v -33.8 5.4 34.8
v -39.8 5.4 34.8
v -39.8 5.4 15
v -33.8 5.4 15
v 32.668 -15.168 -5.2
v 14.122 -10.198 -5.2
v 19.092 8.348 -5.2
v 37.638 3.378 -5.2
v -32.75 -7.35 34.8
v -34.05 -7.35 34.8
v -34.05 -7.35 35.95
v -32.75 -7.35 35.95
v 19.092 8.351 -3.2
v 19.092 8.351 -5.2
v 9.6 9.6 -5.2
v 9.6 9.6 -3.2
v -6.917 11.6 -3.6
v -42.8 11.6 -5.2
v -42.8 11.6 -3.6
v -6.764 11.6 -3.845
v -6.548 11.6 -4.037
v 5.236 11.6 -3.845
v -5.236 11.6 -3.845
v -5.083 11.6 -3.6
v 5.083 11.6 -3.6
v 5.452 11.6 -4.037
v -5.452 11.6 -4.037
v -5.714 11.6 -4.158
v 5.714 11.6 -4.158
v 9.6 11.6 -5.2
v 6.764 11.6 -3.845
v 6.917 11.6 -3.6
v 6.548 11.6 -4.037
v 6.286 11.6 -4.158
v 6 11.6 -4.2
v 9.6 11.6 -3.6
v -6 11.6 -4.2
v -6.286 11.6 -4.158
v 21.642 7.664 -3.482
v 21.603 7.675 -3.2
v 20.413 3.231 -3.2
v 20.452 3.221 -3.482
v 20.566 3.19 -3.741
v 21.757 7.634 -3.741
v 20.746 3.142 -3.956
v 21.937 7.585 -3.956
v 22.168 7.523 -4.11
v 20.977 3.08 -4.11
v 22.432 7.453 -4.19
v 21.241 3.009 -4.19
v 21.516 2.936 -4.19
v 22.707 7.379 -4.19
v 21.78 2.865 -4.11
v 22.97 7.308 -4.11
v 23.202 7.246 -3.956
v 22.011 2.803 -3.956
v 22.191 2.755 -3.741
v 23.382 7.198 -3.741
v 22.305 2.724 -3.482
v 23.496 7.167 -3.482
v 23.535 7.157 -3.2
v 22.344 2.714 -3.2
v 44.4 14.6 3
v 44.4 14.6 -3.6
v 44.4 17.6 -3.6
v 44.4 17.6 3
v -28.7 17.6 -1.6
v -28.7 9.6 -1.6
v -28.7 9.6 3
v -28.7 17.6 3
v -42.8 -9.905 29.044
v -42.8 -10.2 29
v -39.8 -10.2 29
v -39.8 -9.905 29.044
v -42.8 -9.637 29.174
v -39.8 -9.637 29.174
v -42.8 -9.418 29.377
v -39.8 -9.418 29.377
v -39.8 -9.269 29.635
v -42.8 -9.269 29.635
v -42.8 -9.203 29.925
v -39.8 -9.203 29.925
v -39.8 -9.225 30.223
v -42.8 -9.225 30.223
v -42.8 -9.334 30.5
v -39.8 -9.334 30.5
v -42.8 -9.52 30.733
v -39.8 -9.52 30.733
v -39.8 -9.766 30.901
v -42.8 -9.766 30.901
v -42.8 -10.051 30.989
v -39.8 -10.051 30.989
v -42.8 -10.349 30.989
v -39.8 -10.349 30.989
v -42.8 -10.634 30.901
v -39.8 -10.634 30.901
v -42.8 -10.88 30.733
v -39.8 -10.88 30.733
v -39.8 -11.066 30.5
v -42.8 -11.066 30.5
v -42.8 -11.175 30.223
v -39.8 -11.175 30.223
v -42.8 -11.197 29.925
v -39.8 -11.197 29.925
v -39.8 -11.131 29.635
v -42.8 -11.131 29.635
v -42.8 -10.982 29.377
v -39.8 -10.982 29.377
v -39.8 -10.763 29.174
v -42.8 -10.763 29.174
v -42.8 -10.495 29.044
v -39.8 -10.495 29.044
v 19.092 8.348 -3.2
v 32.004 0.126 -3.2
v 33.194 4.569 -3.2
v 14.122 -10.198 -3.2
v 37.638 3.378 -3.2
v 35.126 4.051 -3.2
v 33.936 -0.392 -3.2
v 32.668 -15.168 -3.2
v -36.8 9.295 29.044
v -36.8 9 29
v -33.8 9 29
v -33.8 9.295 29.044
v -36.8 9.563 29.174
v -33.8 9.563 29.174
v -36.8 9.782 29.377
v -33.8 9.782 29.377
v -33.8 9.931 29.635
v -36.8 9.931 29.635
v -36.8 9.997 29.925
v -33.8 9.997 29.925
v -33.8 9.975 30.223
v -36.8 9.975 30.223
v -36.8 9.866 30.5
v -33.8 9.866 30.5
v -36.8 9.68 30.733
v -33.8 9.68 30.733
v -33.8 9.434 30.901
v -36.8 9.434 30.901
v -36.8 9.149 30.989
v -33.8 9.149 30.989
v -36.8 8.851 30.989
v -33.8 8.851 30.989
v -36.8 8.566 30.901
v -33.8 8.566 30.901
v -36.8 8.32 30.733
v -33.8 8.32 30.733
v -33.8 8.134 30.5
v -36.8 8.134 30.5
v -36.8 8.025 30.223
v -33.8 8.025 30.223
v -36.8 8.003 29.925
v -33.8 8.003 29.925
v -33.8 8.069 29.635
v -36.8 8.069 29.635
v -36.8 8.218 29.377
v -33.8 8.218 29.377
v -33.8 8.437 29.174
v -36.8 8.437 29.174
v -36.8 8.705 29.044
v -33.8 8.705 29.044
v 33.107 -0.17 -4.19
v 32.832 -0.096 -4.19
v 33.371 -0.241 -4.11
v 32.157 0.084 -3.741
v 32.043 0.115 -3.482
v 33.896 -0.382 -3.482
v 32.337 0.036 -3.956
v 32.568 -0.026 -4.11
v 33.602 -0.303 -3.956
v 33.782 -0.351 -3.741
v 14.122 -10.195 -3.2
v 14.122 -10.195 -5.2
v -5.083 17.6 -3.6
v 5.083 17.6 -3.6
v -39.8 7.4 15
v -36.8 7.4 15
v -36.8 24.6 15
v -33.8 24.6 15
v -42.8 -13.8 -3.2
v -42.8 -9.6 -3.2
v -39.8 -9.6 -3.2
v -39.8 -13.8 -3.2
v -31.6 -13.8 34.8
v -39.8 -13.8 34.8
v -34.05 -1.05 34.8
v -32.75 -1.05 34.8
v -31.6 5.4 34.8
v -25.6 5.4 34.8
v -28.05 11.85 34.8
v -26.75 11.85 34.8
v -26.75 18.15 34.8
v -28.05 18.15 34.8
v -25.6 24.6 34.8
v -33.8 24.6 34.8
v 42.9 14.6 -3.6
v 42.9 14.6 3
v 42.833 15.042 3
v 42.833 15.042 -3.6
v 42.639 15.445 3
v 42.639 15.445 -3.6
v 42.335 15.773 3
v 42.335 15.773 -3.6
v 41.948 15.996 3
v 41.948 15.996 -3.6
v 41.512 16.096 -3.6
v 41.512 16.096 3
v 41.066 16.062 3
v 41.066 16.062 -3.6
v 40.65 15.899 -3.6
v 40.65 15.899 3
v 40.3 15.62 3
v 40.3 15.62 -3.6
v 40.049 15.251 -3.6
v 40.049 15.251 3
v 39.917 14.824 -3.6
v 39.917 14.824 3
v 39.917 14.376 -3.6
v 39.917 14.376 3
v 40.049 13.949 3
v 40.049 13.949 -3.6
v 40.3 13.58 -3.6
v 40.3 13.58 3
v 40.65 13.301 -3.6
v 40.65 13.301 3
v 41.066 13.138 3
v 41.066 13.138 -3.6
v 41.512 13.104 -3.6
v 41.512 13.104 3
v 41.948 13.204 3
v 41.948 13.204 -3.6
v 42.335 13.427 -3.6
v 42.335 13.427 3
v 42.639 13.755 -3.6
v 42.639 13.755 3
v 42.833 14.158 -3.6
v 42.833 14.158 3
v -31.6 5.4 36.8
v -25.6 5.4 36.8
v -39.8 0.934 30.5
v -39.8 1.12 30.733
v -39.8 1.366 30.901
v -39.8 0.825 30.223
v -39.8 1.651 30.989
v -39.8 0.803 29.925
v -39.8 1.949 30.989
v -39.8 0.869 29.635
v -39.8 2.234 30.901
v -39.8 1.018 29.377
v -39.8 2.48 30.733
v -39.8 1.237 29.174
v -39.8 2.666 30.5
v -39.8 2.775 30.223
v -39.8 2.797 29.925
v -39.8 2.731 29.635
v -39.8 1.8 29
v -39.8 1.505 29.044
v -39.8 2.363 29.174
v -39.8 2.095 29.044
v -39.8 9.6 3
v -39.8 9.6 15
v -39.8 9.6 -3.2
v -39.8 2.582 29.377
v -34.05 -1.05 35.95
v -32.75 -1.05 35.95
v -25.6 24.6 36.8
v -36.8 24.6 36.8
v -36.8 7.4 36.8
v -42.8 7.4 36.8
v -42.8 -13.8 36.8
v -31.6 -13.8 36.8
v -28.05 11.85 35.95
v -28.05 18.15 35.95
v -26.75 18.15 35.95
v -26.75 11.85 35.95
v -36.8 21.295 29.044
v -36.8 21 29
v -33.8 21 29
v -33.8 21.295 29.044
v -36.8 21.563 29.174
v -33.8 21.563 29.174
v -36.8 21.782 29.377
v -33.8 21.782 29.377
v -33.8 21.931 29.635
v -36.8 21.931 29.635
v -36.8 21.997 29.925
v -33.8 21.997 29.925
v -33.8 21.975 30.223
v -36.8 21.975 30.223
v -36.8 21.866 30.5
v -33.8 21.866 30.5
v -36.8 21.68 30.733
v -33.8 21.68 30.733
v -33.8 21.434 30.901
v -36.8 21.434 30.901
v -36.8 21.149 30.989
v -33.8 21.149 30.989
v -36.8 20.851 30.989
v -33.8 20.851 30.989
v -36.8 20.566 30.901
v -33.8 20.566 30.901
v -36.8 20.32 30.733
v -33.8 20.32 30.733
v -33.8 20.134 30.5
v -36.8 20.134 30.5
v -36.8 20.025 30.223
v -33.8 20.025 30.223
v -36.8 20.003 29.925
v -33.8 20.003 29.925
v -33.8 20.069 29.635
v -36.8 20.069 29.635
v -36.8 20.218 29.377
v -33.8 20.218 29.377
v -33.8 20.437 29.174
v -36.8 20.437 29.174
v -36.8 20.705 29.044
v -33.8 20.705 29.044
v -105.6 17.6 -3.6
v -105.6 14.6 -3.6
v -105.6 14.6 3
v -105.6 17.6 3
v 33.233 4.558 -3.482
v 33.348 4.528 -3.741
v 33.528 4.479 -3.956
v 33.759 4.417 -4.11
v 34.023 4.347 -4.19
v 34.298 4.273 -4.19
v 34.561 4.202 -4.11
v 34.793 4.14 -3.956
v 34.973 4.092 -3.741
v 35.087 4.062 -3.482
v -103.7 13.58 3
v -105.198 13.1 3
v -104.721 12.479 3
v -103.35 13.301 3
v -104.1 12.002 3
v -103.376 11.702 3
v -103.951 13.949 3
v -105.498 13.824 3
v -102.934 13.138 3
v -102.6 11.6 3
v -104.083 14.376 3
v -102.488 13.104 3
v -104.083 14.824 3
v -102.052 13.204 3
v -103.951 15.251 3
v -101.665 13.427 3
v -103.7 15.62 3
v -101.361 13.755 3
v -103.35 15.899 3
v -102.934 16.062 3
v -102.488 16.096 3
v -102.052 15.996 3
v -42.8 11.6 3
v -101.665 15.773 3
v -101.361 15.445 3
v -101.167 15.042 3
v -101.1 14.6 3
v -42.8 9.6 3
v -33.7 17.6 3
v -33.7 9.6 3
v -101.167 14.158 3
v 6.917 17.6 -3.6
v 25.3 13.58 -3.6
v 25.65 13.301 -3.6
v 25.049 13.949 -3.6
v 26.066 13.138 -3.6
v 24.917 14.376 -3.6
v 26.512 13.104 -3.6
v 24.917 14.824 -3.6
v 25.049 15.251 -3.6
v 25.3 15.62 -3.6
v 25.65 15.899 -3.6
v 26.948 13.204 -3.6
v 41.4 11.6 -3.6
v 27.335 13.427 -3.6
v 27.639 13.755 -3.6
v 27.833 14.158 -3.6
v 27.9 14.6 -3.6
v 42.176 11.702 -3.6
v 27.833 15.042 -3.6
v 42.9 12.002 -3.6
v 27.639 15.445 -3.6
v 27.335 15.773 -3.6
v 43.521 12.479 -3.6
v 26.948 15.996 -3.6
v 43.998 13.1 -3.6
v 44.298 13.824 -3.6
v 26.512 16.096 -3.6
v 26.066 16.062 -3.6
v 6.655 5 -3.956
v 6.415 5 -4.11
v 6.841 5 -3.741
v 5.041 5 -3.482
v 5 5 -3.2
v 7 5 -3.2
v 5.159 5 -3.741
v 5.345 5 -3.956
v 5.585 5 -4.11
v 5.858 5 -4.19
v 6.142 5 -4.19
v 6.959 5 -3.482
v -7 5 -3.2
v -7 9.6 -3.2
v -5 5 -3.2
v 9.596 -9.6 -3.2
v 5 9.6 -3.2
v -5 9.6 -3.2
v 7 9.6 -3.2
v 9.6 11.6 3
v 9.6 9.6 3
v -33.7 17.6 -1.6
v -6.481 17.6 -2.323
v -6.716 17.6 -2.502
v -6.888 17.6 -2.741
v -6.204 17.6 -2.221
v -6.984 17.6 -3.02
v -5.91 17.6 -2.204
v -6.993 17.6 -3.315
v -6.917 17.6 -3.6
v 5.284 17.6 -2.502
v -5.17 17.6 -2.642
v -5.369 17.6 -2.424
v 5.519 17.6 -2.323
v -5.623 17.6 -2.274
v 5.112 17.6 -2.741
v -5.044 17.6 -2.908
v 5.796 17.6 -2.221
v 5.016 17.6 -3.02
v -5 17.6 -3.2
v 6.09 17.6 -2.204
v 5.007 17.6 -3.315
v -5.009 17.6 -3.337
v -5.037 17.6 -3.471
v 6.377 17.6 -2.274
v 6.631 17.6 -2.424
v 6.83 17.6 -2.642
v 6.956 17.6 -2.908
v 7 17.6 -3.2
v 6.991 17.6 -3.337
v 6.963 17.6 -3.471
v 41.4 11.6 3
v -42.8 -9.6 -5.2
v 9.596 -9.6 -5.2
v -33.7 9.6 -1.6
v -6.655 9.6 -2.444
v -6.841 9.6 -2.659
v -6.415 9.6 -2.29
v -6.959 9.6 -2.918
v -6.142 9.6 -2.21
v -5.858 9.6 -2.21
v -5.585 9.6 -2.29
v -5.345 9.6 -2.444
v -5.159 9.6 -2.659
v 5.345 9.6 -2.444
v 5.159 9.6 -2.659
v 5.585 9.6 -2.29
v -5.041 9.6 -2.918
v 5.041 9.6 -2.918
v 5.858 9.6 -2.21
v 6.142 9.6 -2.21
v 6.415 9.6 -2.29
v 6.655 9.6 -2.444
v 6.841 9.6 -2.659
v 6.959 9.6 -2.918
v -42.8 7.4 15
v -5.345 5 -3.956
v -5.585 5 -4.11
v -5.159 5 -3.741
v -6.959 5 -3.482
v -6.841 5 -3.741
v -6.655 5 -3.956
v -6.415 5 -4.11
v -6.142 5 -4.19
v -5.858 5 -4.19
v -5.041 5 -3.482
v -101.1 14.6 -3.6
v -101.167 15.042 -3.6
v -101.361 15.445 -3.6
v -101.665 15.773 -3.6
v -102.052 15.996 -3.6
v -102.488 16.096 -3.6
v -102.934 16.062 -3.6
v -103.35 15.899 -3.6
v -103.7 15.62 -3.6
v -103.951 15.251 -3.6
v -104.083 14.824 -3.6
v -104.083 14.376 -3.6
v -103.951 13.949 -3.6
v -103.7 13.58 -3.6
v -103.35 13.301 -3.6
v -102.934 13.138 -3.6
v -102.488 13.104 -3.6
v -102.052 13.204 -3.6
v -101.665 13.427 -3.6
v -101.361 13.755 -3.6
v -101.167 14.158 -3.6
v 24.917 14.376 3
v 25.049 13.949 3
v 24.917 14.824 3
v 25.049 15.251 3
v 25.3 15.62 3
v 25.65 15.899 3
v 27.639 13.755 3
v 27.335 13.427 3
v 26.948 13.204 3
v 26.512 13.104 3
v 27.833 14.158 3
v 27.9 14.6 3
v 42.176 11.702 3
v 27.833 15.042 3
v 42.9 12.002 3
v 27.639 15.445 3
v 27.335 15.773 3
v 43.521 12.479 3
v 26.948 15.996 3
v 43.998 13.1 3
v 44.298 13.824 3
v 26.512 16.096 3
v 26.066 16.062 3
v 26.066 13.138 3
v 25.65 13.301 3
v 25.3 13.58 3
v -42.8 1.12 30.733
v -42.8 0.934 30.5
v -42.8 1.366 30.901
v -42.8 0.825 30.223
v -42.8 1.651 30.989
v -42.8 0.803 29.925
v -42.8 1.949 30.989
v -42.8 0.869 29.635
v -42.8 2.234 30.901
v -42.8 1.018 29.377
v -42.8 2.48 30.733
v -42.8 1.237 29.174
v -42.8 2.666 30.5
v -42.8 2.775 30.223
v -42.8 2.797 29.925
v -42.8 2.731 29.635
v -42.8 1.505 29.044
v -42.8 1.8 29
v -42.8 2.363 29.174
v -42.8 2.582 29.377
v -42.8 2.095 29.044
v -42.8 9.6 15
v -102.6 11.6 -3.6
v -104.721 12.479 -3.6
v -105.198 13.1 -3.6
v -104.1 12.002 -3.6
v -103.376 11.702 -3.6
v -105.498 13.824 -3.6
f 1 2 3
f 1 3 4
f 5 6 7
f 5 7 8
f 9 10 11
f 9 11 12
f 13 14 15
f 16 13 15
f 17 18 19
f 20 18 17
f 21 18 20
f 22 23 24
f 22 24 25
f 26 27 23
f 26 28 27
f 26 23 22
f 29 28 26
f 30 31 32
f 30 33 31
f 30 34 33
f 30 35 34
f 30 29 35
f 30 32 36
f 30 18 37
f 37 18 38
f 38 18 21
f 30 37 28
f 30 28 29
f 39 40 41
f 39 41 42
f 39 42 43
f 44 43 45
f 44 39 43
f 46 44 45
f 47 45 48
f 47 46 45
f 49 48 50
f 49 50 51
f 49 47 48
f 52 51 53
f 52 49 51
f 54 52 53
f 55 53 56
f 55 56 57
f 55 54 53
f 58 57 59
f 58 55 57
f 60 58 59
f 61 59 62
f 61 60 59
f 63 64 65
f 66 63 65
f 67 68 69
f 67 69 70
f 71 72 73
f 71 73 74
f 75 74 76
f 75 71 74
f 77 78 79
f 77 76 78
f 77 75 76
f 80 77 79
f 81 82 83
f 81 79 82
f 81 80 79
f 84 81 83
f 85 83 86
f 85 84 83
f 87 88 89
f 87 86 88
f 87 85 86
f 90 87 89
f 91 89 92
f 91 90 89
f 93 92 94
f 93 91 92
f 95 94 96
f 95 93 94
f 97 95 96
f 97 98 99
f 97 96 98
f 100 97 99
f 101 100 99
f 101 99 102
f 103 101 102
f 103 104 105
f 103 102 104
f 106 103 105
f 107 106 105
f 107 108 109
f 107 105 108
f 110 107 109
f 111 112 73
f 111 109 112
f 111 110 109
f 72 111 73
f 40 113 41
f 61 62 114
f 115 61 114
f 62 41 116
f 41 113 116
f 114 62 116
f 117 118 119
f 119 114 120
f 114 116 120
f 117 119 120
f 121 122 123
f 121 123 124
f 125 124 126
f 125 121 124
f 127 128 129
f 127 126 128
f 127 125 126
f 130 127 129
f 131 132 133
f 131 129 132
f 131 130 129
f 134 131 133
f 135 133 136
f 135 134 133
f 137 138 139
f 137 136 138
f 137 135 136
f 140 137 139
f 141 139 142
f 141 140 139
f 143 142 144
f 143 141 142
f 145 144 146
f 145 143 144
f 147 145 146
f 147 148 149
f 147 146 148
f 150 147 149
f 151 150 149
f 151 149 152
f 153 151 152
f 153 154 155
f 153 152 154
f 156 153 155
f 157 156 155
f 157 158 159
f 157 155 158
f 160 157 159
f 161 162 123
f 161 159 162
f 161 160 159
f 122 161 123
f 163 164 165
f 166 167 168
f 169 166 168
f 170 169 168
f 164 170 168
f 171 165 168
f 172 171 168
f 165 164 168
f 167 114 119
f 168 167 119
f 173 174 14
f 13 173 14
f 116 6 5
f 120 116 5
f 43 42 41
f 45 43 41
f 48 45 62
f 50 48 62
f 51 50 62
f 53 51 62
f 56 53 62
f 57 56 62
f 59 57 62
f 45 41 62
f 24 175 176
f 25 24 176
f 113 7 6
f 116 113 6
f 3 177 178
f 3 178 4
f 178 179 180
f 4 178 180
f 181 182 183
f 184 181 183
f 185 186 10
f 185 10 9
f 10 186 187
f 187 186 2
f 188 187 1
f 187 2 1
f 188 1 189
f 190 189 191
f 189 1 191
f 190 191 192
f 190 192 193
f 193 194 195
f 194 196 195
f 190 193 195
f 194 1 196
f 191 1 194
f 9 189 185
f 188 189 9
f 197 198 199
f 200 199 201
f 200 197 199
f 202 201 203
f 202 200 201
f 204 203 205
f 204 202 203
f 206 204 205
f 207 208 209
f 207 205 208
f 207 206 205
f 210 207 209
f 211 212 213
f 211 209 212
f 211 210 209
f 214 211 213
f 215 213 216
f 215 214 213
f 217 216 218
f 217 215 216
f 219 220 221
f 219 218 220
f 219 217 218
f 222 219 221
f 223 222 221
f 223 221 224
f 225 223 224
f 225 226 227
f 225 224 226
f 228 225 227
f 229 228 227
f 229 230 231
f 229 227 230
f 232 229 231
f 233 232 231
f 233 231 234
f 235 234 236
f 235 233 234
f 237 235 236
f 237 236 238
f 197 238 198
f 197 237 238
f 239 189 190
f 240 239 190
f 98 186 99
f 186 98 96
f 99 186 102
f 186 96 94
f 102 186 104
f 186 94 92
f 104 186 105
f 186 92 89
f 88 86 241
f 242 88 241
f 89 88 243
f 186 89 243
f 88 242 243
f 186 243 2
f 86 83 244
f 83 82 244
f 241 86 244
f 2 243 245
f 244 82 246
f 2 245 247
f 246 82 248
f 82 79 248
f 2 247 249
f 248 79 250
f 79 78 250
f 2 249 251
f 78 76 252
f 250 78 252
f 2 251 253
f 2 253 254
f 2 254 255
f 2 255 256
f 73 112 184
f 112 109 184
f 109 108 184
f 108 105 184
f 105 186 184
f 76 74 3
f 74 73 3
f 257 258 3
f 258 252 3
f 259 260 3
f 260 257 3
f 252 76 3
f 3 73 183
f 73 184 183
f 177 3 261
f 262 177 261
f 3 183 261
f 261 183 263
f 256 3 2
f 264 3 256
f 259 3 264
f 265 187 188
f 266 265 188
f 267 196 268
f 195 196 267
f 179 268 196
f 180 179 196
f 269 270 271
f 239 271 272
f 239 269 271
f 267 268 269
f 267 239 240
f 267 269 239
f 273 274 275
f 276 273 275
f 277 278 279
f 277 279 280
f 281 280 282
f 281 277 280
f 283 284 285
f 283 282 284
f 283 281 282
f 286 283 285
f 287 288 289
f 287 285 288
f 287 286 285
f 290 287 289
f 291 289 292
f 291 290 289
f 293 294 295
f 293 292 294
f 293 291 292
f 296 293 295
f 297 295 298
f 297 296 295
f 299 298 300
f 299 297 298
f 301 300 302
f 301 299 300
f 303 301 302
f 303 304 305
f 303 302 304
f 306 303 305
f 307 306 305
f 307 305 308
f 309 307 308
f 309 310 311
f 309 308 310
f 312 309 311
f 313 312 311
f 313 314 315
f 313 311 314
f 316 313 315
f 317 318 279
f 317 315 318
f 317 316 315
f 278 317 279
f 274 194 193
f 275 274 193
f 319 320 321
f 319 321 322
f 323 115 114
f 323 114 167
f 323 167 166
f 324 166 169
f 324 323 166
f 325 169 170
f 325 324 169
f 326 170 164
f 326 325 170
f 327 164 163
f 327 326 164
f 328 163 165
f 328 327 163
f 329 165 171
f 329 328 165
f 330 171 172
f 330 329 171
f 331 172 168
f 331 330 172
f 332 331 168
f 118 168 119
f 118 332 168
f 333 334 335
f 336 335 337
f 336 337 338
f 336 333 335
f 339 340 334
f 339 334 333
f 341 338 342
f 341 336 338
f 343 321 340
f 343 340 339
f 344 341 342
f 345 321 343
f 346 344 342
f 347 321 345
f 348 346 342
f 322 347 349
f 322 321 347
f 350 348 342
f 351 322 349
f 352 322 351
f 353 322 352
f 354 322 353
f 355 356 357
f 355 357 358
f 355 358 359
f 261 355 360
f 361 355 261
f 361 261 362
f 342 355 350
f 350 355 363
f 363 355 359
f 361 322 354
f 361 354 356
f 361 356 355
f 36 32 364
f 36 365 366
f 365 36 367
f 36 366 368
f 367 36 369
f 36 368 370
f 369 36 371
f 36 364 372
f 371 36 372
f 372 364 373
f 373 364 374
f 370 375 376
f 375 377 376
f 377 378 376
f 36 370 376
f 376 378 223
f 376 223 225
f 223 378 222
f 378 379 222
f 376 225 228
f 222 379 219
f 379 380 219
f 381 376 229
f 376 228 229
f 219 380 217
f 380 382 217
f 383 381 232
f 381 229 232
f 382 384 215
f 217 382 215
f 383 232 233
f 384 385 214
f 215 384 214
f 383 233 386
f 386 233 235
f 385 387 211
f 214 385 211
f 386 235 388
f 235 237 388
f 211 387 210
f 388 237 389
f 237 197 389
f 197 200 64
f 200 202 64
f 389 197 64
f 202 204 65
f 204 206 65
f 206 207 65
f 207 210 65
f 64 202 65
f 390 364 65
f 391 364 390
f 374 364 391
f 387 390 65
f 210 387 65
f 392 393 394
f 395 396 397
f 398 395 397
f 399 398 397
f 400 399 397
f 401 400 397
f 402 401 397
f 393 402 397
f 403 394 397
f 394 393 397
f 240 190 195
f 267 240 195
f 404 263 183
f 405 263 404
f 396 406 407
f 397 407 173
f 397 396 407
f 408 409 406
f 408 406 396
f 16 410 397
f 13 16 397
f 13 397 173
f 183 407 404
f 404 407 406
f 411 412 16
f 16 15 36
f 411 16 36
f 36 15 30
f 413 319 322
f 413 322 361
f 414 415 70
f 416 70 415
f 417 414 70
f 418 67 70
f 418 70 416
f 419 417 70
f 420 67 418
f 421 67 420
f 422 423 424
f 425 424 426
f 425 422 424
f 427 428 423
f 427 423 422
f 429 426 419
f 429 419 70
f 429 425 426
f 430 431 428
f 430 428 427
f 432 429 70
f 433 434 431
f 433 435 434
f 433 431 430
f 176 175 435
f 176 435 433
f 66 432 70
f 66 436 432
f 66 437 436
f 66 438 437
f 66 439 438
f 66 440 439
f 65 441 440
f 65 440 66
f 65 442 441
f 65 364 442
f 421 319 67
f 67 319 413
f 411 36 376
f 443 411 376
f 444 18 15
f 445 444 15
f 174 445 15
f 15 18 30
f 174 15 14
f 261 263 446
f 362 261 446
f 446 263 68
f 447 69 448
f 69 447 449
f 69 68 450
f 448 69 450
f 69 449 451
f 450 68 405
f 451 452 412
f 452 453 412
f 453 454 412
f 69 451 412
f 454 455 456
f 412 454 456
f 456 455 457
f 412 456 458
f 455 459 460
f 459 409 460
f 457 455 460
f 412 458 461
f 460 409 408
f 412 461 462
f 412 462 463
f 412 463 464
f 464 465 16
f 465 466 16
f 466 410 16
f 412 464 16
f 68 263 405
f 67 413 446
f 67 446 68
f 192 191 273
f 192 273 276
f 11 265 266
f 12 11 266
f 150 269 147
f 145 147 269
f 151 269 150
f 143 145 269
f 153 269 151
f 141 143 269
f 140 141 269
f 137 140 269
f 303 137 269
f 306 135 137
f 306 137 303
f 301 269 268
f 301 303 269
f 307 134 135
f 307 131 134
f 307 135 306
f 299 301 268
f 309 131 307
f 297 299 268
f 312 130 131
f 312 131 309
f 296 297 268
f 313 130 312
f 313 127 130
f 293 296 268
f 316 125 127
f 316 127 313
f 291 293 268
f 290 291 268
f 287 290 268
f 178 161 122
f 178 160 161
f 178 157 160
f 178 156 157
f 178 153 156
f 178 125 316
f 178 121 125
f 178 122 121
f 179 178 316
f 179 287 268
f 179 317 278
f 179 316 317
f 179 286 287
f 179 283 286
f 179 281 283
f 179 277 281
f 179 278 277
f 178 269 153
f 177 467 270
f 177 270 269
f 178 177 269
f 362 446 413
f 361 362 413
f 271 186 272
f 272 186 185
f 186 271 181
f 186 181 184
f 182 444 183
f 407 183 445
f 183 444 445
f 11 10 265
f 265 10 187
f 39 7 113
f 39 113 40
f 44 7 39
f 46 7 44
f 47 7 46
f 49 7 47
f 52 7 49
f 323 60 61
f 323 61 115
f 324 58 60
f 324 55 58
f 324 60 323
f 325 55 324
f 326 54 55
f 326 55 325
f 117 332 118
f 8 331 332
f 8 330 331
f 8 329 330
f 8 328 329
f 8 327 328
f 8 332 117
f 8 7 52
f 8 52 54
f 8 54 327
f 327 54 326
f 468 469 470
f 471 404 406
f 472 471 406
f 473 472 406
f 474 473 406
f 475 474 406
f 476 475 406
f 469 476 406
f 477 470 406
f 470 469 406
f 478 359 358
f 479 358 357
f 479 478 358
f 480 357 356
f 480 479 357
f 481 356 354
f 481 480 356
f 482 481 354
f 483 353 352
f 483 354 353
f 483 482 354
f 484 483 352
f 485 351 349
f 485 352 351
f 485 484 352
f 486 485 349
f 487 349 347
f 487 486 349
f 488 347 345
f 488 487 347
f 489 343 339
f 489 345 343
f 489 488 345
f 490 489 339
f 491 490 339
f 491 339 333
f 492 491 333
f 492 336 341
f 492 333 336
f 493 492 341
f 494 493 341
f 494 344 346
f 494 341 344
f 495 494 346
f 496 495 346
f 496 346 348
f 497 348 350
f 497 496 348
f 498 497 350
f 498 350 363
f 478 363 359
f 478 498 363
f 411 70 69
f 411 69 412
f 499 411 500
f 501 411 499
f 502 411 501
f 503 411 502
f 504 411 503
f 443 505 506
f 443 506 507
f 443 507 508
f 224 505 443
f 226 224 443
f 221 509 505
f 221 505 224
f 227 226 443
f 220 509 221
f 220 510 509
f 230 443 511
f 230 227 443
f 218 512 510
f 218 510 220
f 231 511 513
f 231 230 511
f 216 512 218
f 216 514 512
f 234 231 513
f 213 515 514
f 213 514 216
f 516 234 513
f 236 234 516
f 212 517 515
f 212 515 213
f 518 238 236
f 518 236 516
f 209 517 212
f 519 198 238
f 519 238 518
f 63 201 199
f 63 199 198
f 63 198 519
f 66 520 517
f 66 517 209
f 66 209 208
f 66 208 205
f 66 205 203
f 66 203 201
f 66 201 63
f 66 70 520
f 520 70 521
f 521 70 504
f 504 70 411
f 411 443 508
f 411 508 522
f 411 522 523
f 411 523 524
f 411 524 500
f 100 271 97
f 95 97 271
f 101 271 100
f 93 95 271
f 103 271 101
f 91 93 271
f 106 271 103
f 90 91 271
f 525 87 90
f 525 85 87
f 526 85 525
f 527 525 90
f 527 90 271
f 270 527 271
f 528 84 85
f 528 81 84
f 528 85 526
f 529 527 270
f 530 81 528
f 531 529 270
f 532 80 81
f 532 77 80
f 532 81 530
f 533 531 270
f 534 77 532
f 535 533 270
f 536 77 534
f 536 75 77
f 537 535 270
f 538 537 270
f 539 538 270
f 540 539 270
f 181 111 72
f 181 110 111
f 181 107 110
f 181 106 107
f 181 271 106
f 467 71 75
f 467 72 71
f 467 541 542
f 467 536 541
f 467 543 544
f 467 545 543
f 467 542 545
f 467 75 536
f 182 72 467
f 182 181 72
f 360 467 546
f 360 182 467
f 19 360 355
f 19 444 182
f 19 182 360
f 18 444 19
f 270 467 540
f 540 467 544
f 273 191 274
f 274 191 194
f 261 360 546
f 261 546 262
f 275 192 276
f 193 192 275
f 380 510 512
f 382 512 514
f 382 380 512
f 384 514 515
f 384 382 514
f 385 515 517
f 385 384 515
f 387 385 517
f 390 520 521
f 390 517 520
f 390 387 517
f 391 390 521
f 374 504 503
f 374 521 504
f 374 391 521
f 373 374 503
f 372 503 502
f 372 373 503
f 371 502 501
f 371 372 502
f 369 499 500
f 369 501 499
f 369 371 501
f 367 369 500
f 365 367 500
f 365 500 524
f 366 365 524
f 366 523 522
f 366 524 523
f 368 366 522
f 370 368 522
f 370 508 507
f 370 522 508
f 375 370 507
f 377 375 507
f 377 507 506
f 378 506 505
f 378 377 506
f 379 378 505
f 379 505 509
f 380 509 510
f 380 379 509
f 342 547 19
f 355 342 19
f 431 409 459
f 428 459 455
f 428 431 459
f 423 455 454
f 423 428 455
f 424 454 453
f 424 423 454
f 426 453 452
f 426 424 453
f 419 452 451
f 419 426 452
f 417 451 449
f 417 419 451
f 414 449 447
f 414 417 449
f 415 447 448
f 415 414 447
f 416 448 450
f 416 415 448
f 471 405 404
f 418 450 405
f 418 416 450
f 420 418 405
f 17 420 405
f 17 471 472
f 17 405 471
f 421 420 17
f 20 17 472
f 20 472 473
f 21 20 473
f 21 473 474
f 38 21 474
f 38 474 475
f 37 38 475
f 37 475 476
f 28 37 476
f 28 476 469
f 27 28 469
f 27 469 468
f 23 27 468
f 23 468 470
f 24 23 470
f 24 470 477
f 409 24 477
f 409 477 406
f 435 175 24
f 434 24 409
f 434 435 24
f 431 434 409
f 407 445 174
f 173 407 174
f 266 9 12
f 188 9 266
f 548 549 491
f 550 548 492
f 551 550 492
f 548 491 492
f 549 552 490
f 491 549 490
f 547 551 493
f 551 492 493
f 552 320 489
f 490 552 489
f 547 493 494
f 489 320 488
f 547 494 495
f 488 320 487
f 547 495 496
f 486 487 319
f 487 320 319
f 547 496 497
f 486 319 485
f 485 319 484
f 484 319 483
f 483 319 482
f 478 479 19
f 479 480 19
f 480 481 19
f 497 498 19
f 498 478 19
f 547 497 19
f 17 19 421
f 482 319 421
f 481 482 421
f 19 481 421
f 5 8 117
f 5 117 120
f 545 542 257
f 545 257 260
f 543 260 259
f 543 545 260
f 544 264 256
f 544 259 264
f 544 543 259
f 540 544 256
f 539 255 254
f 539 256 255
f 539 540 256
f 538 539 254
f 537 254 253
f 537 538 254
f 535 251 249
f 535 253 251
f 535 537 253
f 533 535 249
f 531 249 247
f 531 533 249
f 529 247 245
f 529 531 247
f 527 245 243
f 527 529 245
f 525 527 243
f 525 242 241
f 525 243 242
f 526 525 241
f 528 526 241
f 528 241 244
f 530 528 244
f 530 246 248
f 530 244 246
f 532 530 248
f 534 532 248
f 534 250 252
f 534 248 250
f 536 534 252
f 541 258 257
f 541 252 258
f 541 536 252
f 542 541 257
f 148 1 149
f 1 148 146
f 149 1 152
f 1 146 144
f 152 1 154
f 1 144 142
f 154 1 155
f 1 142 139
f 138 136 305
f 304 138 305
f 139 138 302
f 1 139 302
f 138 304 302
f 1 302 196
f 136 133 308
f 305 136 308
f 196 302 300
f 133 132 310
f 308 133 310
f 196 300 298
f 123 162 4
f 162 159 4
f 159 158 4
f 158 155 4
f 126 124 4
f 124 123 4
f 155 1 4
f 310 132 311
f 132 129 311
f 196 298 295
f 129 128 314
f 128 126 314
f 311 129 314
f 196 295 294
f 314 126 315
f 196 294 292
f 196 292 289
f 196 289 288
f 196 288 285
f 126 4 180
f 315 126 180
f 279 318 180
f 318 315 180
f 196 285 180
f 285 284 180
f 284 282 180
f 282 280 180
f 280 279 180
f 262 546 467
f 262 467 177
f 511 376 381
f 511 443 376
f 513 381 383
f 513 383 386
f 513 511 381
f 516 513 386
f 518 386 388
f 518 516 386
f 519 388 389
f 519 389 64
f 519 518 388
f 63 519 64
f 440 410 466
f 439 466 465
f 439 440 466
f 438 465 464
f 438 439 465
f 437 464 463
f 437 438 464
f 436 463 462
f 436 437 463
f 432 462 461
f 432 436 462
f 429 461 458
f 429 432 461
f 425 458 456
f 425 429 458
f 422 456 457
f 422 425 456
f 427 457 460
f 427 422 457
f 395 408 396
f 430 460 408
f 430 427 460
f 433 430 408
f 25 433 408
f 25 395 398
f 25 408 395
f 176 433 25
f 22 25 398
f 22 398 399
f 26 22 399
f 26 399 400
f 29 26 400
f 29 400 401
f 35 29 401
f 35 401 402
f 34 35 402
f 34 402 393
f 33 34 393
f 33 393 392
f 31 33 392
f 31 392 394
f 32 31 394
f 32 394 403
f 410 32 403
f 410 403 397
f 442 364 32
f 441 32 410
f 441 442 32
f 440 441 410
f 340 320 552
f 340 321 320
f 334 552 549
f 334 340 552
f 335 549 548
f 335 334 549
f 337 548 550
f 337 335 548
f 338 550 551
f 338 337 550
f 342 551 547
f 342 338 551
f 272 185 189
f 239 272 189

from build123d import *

# Parameters (mm, degrees)
RECTANGLE008_W             = 5
RECTANGLE008_H             = 10
EXTRUDE015_DEPTH           = 5.4
CYLINDER009_R              = 1
CYLINDER009_DEPTH          = 7
CYLINDER008_R              = 1
CYLINDER008_DEPTH          = 7
FUSION019_PLACEMENT_ANGLE  = 15
CYLINDER011_R              = 1
CYLINDER011_DEPTH          = 10
CYLINDER010_R              = 1
CYLINDER010_DEPTH          = 10
CYLINDER013_R              = 1
CYLINDER013_DEPTH          = 10
CYLINDER012_R              = 1
CYLINDER012_DEPTH          = 10
CYLINDER007_R              = 1
CYLINDER007_DEPTH          = 20
CYLINDER006_R              = 1
CYLINDER006_DEPTH          = 20
BOX011_W                   = 52.4
BOX011_H                   = 2
BOX011_DEPTH               = 8.2
EXTRUDE012_DEPTH           = 2
RECTANGLE006_W             = 19.2
RECTANGLE006_H             = 19.2
EXTRUDE013_DEPTH           = 2
EXTRUDE013_PLACEMENT_ANGLE = 15
BOX010_W                   = 52.4
BOX010_H                   = 19.2
BOX010_DEPTH               = 2
CYLINDER004_R              = 1.5
CYLINDER004_DEPTH          = 10
CYLINDER005_R              = 1.5
CYLINDER005_DEPTH          = 10
CYLINDER003_R              = 1.5
CYLINDER003_DEPTH          = 10
RECTANGLE007_W             = 150
RECTANGLE007_H             = 6
EXTRUDE014_DEPTH           = 6.6
FILLET001_R                = 3
BOX009_W                   = 6
BOX009_H                   = 2
BOX009_DEPTH               = 21.8
BOX008_W                   = 1.3
BOX008_H                   = 6.3
BOX008_DEPTH               = 1.15
BOX007_W                   = 11.2
BOX007_H                   = 19.2
BOX007_DEPTH               = 2
BOX006_W                   = 3
BOX006_H                   = 19.2
BOX006_DEPTH               = 38
BOX004_W                   = 1.3
BOX004_H                   = 6.3
BOX004_DEPTH               = 1.15
BOX003_W                   = 11.2
BOX003_H                   = 19.2
BOX003_DEPTH               = 2
BOX001_W                   = 3
BOX001_H                   = 19.2
BOX001_DEPTH               = 19.8
BOX014_W                   = 3
BOX014_H                   = 4.2
BOX014_DEPTH               = 18.2


with BuildPart() as extrude016:
    # Rectangle008 → Extrude015 (new body)
    with BuildSketch(Plane(origin=(-33.7, 9.6, 8.4), x_dir=(1, 0, 0), z_dir=(0, 0, 1))):
        with Locations((2.5, 5)):
            Rectangle(RECTANGLE008_W, RECTANGLE008_H)
    extrude(amount=EXTRUDE015_DEPTH)


with BuildPart() as extrude016_1:
    # Extrude015 placement: moved
    add(extrude016.part.moved(Location((0, 0, -10))))


with BuildPart() as cylinder009:
    # Cylinder009 → Cylinder009 (new body)
    with BuildSketch(Plane(origin=(-6, 12, -3.2), x_dir=(1, 0, 0), z_dir=(0, -1, 0))):
        Circle(CYLINDER009_R)
    extrude(amount=CYLINDER009_DEPTH)


with BuildPart() as fusion021:
    # Cylinder008 → Cylinder008 (new body)
    with BuildSketch(Plane(origin=(6, 12, -3.2), x_dir=(1, 0, 0), z_dir=(0, -1, 0))):
        Circle(CYLINDER008_R)
    extrude(amount=CYLINDER008_DEPTH)

    # Fusion019: union Cylinder009
    add(cylinder009.part)


with BuildPart() as fusion021_1:
    # Fusion019 placement: moved
    add(fusion021.part.moved(Location((25.88, -3.41, 0))).rotate(Axis((25.88, -3.41, 0), (0, 0, -1)), FUSION019_PLACEMENT_ANGLE))


with BuildPart() as cylinder011:
    # Cylinder011 → Cylinder011 (new body)
    with BuildSketch(Plane(origin=(0, -6, 0), x_dir=(0, 0, -1), z_dir=(1, 0, 0))):
        Circle(CYLINDER011_R)
    extrude(amount=CYLINDER011_DEPTH)


with BuildPart() as fusion022:
    # Cylinder010 → Cylinder010 (new body)
    with BuildSketch(Plane(origin=(0, 6, 0), x_dir=(0, 0, -1), z_dir=(1, 0, 0))):
        Circle(CYLINDER010_R)
    extrude(amount=CYLINDER010_DEPTH)

    # Fusion020: union Cylinder011
    add(cylinder011.part)


with BuildPart() as fusion022_1:
    # Fusion020 placement: moved
    add(fusion022.part.moved(Location((-40, 15, 30))))


with BuildPart() as cylinder013:
    # Cylinder013 → Cylinder013 (new body)
    with BuildSketch(Plane(origin=(0, -6, 0), x_dir=(0, 0, -1), z_dir=(1, 0, 0))):
        Circle(CYLINDER013_R)
    extrude(amount=CYLINDER013_DEPTH)


with BuildPart() as fusion023:
    # Cylinder012 → Cylinder012 (new body)
    with BuildSketch(Plane(origin=(0, 6, 0), x_dir=(0, 0, -1), z_dir=(1, 0, 0))):
        Circle(CYLINDER012_R)
    extrude(amount=CYLINDER012_DEPTH)

    # Fusion021: union Cylinder013
    add(cylinder013.part)


with BuildPart() as fusion023_1:
    # Fusion021 placement: moved
    add(fusion023.part.moved(Location((-48, -4.2, 30))))


with BuildPart() as cylinder007:
    # Cylinder007 → Cylinder007 (new body)
    with BuildSketch(Plane(origin=(-6, 25, -3.2), x_dir=(1, 0, 0), z_dir=(0, -1, 0))):
        Circle(CYLINDER007_R)
    extrude(amount=CYLINDER007_DEPTH)


with BuildPart() as fusion024:
    # Cylinder006 → Cylinder006 (new body)
    with BuildSketch(Plane(origin=(6, 25, -3.2), x_dir=(1, 0, 0), z_dir=(0, -1, 0))):
        Circle(CYLINDER006_R)
    extrude(amount=CYLINDER006_DEPTH)

    # Fusion018: union Cylinder007
    add(cylinder007.part)

    # Fusion022: union Fusion021, Fusion022, Fusion023
    add(fusion021_1.part)
    add(fusion022_1.part)
    add(fusion023_1.part)


with BuildPart() as cube013:
    # Box011 → Box011 (new body)
    with BuildSketch(Plane(origin=(-42.8, 9.6, -5.2), x_dir=(1, 0, 0), z_dir=(0, 0, 1))):
        with Locations((26.2, 1)):
            Rectangle(BOX011_W, BOX011_H)
    extrude(amount=BOX011_DEPTH)


with BuildPart() as extrude012:
    # Wire001 → Extrude012 (new body)
    with BuildSketch(Plane(origin=(9.596443, -9.60026, 0), x_dir=(1, 0, 0), z_dir=(0, 0, 1))):
        Polygon((0, 0), (4.525942, -0.594952), (9.495331, 17.950812), (0.003557, 19.20026), align=None)
    extrude(amount=EXTRUDE012_DEPTH)


with BuildPart() as extrude012_1:
    # Extrude012 placement: moved
    add(extrude012.part.moved(Location((0, 0, -5.2))))


with BuildPart() as extrude014:
    # Rectangle006 → Extrude013 (new body)
    with BuildSketch(Plane(origin=(-9.6, 9.6, -5.2), x_dir=(1, 0, 0), z_dir=(0, 0, -1))):
        with Locations((9.6, 9.6)):
            Rectangle(RECTANGLE006_W, RECTANGLE006_H)
    extrude(amount=-EXTRUDE013_DEPTH)


with BuildPart() as extrude014_1:
    # Extrude013 placement: moved
    add(extrude014.part.moved(Location((25.88, -3.41, 0))).rotate(Axis((25.88, -3.41, 0), (0, 0, -1)), EXTRUDE013_PLACEMENT_ANGLE))


with BuildPart() as fusion014:
    # Box010 → Box010 (new body)
    with BuildSketch(Plane(origin=(-42.8, -9.6, -5.2), x_dir=(1, 0, 0), z_dir=(0, 0, 1))):
        with Locations((26.2, 9.6)):
            Rectangle(BOX010_W, BOX010_H)
    extrude(amount=BOX010_DEPTH)

    # Fusion013: union Extrude012, Extrude014
    add(extrude012_1.part)
    add(extrude014_1.part)


with BuildPart() as cylinder004:
    # Cylinder004 → Cylinder004 (new body)
    with BuildSketch(Plane(origin=(26.4, 12.6, 5), x_dir=(1, 0, 0), z_dir=(0, 0, 1))):
        Circle(CYLINDER004_R)
    extrude(amount=CYLINDER004_DEPTH)


with BuildPart() as cylinder005:
    # Cylinder005 → Cylinder005 (new body)
    with BuildSketch(Plane(origin=(11.4, 12.6, 5), x_dir=(1, 0, 0), z_dir=(0, 0, 1))):
        Circle(CYLINDER005_R)
    extrude(amount=CYLINDER005_DEPTH)


with BuildPart() as fusion008:
    # Cylinder003 → Cylinder003 (new body)
    with BuildSketch(Plane(origin=(-117.6, 12.6, 5), x_dir=(1, 0, 0), z_dir=(0, 0, 1))):
        Circle(CYLINDER003_R)
    extrude(amount=CYLINDER003_DEPTH)

    # Fusion008: union Cylinder004, Cylinder005
    add(cylinder004.part)
    add(cylinder005.part)


with BuildPart() as cut013:
    # Rectangle007 → Extrude014 (new body)
    with BuildSketch(Plane(origin=(-120.6, 9.6, 5), x_dir=(1, 0, 0), z_dir=(0, 0, 1))):
        with Locations((75, 3)):
            Rectangle(RECTANGLE007_W, RECTANGLE007_H)
    extrude(amount=EXTRUDE014_DEPTH)

    # Fillet001
    fillet001_edges = [cut013.edges().sort_by_distance(p)[0] for p in [
        (-120.6, 9.6, 8.3),
        (29.4, 9.6, 8.3),
    ]]
    fillet(fillet001_edges, radius=FILLET001_R)

    # Cut004: cut Fusion008
    add(fusion008.part, mode=Mode.SUBTRACT)


with BuildPart() as cut013_1:
    # Cut004 placement: moved
    add(cut013.part.moved(Location((15, 2, -8.6))))


with BuildPart() as cube009:
    # Box009 → Box009 (new body)
    with BuildSketch(Plane(origin=(-42.8, 5.4, 15), x_dir=(1, 0, 0), z_dir=(0, 0, 1))):
        with Locations((3, 1)):
            Rectangle(BOX009_W, BOX009_H)
    extrude(amount=BOX009_DEPTH)


with BuildPart() as cube008:
    # Box008 → Box008 (new body)
    with BuildSketch(Plane(origin=(-28.05, 11.85, 34.2), x_dir=(1, 0, 0), z_dir=(0, 0, 1))):
        with Locations((0.65, 3.15)):
            Rectangle(BOX008_W, BOX008_H)
    extrude(amount=BOX008_DEPTH)


with BuildPart() as cut012:
    # Box007 → Box007 (new body)
    with BuildSketch(Plane(origin=(-36.8, 5.4, 34.2), x_dir=(1, 0, 0), z_dir=(0, 0, 1))):
        with Locations((5.6, 9.6)):
            Rectangle(BOX007_W, BOX007_H)
    extrude(amount=BOX007_DEPTH)

    # Cut003: cut Cube008
    add(cube008.part, mode=Mode.SUBTRACT)


with BuildPart() as fusion007:
    # Box006 → Box006 (new body)
    with BuildSketch(Plane(origin=(-36.8, 5.4, -3.8), x_dir=(1, 0, 0), z_dir=(0, 0, 1))):
        with Locations((1.5, 9.6)):
            Rectangle(BOX006_W, BOX006_H)
    extrude(amount=BOX006_DEPTH)

    # Fusion007: union Cut012
    add(cut012.part)


with BuildPart() as fusion007_1:
    # Fusion007 placement: moved
    add(fusion007.part.moved(Location((-6, -19.2, 0.6))))


with BuildPart() as cube004:
    # Box004 → Box004 (new body)
    with BuildSketch(Plane(origin=(-28.05, 11.85, 34.2), x_dir=(1, 0, 0), z_dir=(0, 0, 1))):
        with Locations((0.65, 3.15)):
            Rectangle(BOX004_W, BOX004_H)
    extrude(amount=BOX004_DEPTH)


with BuildPart() as cut011:
    # Box003 → Box003 (new body)
    with BuildSketch(Plane(origin=(-36.8, 5.4, 34.2), x_dir=(1, 0, 0), z_dir=(0, 0, 1))):
        with Locations((5.6, 9.6)):
            Rectangle(BOX003_W, BOX003_H)
    extrude(amount=BOX003_DEPTH)

    # Cut002: cut Cube004
    add(cube004.part, mode=Mode.SUBTRACT)


with BuildPart() as fusion006:
    # Box001 → Box001 (new body)
    with BuildSketch(Plane(origin=(-36.8, 5.4, 14.4), x_dir=(1, 0, 0), z_dir=(0, 0, 1))):
        with Locations((1.5, 9.6)):
            Rectangle(BOX001_W, BOX001_H)
    extrude(amount=BOX001_DEPTH)

    # Fusion006: union Cut011
    add(cut011.part)


with BuildPart() as fusion006_1:
    # Fusion006 placement: moved
    add(fusion006.part.moved(Location((0, 0, 0.6))))


with BuildPart() as cut017:
    # Box014 → Box014 (new body)
    with BuildSketch(Plane(origin=(-42.8, 5.4, -3.2), x_dir=(1, 0, 0), z_dir=(0, 0, 1))):
        with Locations((1.5, 2.1)):
            Rectangle(BOX014_W, BOX014_H)
    extrude(amount=BOX014_DEPTH)

    # Fusion024: union Cube013, Fusion014, Cut013, Cube009, Fusion007, Fusion006
    add(cube013.part)
    add(fusion014.part)
    add(cut013_1.part)
    add(cube009.part)
    add(fusion007_1.part)
    add(fusion006_1.part)

    # Cut005: cut Fusion024
    add(fusion024.part, mode=Mode.SUBTRACT)

    # Cut008: cut Extrude016
    add(extrude016_1.part, mode=Mode.SUBTRACT)


solid = cut017.part
